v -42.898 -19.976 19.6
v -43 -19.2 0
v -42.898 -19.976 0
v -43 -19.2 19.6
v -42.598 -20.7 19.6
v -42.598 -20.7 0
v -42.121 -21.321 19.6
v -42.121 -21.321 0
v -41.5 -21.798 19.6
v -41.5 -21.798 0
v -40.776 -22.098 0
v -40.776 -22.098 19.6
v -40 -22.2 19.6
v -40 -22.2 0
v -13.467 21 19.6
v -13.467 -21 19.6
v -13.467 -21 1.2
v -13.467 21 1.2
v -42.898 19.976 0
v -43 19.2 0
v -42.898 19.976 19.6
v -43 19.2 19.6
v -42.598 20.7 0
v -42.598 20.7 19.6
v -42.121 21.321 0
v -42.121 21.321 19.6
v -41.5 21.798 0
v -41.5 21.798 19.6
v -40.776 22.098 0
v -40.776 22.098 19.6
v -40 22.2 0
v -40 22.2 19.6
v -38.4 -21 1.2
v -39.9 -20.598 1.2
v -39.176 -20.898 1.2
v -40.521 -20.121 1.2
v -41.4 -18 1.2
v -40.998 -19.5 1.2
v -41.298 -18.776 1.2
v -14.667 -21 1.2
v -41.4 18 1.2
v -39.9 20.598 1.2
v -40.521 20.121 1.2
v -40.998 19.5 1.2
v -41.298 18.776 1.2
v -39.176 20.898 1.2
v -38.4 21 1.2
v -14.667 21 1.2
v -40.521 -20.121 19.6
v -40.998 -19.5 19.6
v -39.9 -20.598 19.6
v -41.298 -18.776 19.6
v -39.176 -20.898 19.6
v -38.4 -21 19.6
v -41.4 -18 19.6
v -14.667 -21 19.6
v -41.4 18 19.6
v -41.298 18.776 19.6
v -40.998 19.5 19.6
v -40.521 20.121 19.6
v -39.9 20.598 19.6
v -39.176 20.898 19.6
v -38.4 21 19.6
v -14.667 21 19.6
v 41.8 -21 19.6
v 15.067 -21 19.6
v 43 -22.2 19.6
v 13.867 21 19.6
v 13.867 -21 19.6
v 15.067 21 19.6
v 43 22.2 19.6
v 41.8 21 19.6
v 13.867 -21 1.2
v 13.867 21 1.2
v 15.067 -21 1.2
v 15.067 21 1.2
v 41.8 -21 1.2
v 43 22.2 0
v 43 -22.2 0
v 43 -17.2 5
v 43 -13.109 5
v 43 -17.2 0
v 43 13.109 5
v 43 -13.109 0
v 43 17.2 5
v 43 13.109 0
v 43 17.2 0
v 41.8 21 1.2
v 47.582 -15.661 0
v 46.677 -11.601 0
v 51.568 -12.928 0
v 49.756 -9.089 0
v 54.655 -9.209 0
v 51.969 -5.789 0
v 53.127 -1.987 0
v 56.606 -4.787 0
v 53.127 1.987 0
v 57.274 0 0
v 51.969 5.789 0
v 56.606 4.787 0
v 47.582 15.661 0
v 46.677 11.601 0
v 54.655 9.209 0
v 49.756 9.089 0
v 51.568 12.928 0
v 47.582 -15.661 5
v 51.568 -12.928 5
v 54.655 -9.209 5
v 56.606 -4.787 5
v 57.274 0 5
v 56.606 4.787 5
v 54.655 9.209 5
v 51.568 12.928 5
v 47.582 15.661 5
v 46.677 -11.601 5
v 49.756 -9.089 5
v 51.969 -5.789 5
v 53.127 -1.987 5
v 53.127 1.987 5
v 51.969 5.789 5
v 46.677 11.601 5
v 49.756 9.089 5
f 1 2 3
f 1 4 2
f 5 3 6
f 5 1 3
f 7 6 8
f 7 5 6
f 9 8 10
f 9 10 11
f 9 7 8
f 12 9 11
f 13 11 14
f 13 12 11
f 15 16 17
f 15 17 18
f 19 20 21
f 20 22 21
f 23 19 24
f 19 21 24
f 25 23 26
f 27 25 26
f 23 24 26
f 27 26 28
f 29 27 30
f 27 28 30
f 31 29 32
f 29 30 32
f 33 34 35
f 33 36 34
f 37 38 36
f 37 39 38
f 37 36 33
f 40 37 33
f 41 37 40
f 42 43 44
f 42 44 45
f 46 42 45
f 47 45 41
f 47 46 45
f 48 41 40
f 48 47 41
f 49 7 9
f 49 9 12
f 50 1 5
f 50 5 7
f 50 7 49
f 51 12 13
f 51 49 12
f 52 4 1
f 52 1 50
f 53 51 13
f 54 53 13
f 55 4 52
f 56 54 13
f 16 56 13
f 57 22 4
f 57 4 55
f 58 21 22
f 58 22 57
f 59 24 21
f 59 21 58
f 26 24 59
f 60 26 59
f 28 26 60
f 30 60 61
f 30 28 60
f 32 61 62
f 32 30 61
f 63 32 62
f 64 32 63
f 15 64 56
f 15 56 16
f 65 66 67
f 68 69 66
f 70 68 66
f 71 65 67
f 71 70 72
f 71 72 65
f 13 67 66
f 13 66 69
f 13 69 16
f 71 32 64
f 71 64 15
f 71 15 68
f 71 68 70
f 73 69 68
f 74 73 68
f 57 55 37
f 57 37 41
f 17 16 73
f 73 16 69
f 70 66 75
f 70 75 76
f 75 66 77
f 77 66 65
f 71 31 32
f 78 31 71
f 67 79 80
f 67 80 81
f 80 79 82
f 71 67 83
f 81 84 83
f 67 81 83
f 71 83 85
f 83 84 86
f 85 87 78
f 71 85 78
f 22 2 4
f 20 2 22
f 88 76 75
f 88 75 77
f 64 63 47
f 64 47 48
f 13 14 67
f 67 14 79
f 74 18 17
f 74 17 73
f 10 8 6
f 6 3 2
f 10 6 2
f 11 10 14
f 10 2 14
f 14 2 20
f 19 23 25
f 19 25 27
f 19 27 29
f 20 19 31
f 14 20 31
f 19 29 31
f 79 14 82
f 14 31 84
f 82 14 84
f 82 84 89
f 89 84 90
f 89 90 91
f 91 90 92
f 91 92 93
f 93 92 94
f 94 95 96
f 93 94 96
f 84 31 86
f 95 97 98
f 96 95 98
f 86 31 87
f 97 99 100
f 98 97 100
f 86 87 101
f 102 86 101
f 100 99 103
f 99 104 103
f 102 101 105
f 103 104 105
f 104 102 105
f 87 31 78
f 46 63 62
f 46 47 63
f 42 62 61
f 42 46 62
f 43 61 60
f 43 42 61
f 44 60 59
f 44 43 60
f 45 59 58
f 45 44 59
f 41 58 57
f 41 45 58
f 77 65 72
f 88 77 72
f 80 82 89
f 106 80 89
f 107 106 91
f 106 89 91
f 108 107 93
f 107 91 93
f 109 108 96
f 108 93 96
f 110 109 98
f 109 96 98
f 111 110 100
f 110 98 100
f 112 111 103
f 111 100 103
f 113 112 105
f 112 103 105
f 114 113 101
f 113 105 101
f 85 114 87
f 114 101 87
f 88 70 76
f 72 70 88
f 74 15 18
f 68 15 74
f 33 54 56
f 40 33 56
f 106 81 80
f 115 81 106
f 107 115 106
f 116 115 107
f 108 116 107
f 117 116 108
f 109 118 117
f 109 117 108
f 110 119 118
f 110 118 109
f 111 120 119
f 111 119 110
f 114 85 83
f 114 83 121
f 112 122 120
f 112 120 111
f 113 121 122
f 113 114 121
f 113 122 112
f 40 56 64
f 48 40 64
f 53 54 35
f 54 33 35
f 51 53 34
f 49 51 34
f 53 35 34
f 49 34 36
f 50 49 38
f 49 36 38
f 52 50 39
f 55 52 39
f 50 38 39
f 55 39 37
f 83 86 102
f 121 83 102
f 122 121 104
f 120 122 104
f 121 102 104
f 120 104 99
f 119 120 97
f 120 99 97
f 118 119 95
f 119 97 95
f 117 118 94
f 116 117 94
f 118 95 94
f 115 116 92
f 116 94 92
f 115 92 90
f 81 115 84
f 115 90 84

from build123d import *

# Parameters (mm, degrees)
SKETCH_1_W          = 86
SKETCH_1_H          = 44.4
EXTRUDE_1_DEPTH     = 19.6
EXTRUDE_2_DEPTH     = 5
SKETCH_3_W          = 26.733333333
SKETCH_3_H          = 42
SKETCH_3_W_2        = 27.333333334
CUT_EXTRUDE_1_DEPTH = 18.4
FILLET_1_R          = 3


with BuildPart() as part:
    # Эскиз1 → Бобышка-Вытянуть1 (new body)
    with BuildSketch(Plane.XY):
        Rectangle(SKETCH_1_W, SKETCH_1_H)
    extrude(amount=EXTRUDE_1_DEPTH)

    # Эскиз2 → Бобышка-Вытянуть2 (add)
    with BuildSketch(Plane.XY):
        with BuildLine():
            Line((43, 17.2), (43, 13.108775687))
            ThreePointArc((43, 13.108775687), (53.273546839, 0), (43, -13.108775687))
            Line((43, -13.108775687), (43, -17.2))
            ThreePointArc((43, -17.2), (57.273546839, 0), (43, 17.2))
        make_face()
    extrude(amount=EXTRUDE_2_DEPTH)

    # Эскиз3 → Вырез-Вытянуть1 (cut)
    with BuildSketch(Plane.XY.offset(19.6)):
        with Locations((-28.033333334, 0)):
            Rectangle(SKETCH_3_W, SKETCH_3_H)
        with Locations((0.2, 0)):
            Rectangle(SKETCH_3_W_2, SKETCH_3_H)
        with Locations((28.433333334, 0)):
            Rectangle(SKETCH_3_W, SKETCH_3_H)
    extrude(amount=-CUT_EXTRUDE_1_DEPTH, mode=Mode.SUBTRACT)

    # Скругление1
    fillet_1_edges = [part.edges().sort_by_distance(p)[0] for p in [
        (-41.4, 21, 10.4),
        (-41.4, -21, 10.4),
        (-43, -22.2, 9.8),
        (-43, 22.2, 9.8),
    ]]
    fillet(fillet_1_edges, radius=FILLET_1_R)


solid = part.part
